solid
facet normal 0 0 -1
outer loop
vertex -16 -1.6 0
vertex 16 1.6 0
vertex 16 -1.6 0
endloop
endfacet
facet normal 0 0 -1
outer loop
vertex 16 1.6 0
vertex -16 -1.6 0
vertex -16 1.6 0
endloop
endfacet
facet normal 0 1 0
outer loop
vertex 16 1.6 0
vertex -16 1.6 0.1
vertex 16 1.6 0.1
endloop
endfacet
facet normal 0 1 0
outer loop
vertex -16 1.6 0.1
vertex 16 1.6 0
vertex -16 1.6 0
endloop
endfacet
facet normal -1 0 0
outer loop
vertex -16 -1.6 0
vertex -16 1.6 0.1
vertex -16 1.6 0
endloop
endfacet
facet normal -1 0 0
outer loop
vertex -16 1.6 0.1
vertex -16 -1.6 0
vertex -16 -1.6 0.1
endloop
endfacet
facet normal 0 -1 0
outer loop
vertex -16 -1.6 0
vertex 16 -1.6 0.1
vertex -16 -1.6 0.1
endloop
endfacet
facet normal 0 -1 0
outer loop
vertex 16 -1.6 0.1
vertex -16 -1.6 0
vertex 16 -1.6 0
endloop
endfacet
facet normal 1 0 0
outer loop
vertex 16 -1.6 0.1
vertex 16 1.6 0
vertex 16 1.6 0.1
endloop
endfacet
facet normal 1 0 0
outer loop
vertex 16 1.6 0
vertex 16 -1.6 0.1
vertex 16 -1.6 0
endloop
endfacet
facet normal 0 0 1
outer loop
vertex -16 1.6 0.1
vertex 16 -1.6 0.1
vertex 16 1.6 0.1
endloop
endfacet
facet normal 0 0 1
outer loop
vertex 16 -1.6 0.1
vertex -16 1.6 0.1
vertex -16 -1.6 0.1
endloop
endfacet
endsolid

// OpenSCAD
// file: ../p/box5-12.scad
use <../lib.scad>
function ldraw_lib__box5_12() = [
// 0 Box with 5 Faces without Any Edges
// 0 Name: box5-12.dat
// 0 Author: Chris Dee [cwdee]
// 0 !LDRAW_ORG Primitive UPDATE 2009-02
// 0 !LICENSE Licensed under CC BY 4.0 : see CAreadme.txt
// 
// 0 BFC CERTIFY CCW
  [0,"BFC","CERTIFY"],
  [0,"BFC","CCW"],
// 
// 0 !HISTORY 2009-09-03 [PTadmin] Official Update 2009-02
// 
// 
// 4 16 1 1 1 1 1 -1 -1 1 -1 -1 1 1
  [4,16,1,1,1,1,1,-1,-1,1,-1,-1,1,1],
// 4 16 -1 0 1 1 0 1 1 1 1 -1 1 1
  [4,16,-1,0,1,1,0,1,1,1,1,-1,1,1],
// 4 16 -1 0 -1 -1 0 1 -1 1 1 -1 1 -1
  [4,16,-1,0,-1,-1,0,1,-1,1,1,-1,1,-1],
// 4 16 1 0 -1 -1 0 -1 -1 1 -1 1 1 -1
  [4,16,1,0,-1,-1,0,-1,-1,1,-1,1,1,-1],
// 4 16 1 0 1 1 0 -1 1 1 -1 1 1 1
  [4,16,1,0,1,1,0,-1,1,1,-1,1,1,1],
// 0
];
module ldraw_lib__box5_12(step=0, col=false, unit=2/5, alt=false, line=0.2, solid=!$preview)
    makepoly(ldraw_lib__box5_12(), step=step, col=col, unit=unit, alt=alt, line=line, solid=solid);
ldraw_lib__box5_12(line=0.2);
// main file
use <../lib.scad>
use <../p/box5-12.scad>
function ldraw_lib__821445e() = [
// 0 Sticker  0.4 x  4 Blue
// 0 Name: 821445e.dat
// 0 Author: Takeshi Takahashi [RainbowDolphin]
// 0 !LDRAW_ORG Part UPDATE 2026-04
// 0 !LICENSE Licensed under CC BY 4.0 : see CAreadme.txt
// 
// 0 BFC CERTIFY CCW
  [0,"BFC","CERTIFY"],
  [0,"BFC","CCW"],
// 
// 0 !KEYWORDS Hovercraft, set 8824, Technic
// 
// 0 !HISTORY 2026-04-27 [OrionP] Official Update 2026-04
// 
// 1 16 0 -0.25 0 40 0 0 0 0.25 0 0 0 4 box5-12.dat
  [1,16,0,-0.25,0,40,0,0,0,0.25,0,0,0,4, ldraw_lib__box5_12()],
// 4 1 40 -0.25 4 -40 -0.25 4 -40 -0.25 -4 40 -0.25 -4
  [4,1,40,-0.25,4,-40,-0.25,4,-40,-0.25,-4,40,-0.25,-4],
];
module ldraw_lib__821445e(step=0, col=false, unit=2/5, alt=false, line=0.2, solid=!$preview)
    makepoly(ldraw_lib__821445e(), step=step, col=col, unit=unit, alt=alt, line=line, solid=solid);
ldraw_lib__821445e(line=0.2);
